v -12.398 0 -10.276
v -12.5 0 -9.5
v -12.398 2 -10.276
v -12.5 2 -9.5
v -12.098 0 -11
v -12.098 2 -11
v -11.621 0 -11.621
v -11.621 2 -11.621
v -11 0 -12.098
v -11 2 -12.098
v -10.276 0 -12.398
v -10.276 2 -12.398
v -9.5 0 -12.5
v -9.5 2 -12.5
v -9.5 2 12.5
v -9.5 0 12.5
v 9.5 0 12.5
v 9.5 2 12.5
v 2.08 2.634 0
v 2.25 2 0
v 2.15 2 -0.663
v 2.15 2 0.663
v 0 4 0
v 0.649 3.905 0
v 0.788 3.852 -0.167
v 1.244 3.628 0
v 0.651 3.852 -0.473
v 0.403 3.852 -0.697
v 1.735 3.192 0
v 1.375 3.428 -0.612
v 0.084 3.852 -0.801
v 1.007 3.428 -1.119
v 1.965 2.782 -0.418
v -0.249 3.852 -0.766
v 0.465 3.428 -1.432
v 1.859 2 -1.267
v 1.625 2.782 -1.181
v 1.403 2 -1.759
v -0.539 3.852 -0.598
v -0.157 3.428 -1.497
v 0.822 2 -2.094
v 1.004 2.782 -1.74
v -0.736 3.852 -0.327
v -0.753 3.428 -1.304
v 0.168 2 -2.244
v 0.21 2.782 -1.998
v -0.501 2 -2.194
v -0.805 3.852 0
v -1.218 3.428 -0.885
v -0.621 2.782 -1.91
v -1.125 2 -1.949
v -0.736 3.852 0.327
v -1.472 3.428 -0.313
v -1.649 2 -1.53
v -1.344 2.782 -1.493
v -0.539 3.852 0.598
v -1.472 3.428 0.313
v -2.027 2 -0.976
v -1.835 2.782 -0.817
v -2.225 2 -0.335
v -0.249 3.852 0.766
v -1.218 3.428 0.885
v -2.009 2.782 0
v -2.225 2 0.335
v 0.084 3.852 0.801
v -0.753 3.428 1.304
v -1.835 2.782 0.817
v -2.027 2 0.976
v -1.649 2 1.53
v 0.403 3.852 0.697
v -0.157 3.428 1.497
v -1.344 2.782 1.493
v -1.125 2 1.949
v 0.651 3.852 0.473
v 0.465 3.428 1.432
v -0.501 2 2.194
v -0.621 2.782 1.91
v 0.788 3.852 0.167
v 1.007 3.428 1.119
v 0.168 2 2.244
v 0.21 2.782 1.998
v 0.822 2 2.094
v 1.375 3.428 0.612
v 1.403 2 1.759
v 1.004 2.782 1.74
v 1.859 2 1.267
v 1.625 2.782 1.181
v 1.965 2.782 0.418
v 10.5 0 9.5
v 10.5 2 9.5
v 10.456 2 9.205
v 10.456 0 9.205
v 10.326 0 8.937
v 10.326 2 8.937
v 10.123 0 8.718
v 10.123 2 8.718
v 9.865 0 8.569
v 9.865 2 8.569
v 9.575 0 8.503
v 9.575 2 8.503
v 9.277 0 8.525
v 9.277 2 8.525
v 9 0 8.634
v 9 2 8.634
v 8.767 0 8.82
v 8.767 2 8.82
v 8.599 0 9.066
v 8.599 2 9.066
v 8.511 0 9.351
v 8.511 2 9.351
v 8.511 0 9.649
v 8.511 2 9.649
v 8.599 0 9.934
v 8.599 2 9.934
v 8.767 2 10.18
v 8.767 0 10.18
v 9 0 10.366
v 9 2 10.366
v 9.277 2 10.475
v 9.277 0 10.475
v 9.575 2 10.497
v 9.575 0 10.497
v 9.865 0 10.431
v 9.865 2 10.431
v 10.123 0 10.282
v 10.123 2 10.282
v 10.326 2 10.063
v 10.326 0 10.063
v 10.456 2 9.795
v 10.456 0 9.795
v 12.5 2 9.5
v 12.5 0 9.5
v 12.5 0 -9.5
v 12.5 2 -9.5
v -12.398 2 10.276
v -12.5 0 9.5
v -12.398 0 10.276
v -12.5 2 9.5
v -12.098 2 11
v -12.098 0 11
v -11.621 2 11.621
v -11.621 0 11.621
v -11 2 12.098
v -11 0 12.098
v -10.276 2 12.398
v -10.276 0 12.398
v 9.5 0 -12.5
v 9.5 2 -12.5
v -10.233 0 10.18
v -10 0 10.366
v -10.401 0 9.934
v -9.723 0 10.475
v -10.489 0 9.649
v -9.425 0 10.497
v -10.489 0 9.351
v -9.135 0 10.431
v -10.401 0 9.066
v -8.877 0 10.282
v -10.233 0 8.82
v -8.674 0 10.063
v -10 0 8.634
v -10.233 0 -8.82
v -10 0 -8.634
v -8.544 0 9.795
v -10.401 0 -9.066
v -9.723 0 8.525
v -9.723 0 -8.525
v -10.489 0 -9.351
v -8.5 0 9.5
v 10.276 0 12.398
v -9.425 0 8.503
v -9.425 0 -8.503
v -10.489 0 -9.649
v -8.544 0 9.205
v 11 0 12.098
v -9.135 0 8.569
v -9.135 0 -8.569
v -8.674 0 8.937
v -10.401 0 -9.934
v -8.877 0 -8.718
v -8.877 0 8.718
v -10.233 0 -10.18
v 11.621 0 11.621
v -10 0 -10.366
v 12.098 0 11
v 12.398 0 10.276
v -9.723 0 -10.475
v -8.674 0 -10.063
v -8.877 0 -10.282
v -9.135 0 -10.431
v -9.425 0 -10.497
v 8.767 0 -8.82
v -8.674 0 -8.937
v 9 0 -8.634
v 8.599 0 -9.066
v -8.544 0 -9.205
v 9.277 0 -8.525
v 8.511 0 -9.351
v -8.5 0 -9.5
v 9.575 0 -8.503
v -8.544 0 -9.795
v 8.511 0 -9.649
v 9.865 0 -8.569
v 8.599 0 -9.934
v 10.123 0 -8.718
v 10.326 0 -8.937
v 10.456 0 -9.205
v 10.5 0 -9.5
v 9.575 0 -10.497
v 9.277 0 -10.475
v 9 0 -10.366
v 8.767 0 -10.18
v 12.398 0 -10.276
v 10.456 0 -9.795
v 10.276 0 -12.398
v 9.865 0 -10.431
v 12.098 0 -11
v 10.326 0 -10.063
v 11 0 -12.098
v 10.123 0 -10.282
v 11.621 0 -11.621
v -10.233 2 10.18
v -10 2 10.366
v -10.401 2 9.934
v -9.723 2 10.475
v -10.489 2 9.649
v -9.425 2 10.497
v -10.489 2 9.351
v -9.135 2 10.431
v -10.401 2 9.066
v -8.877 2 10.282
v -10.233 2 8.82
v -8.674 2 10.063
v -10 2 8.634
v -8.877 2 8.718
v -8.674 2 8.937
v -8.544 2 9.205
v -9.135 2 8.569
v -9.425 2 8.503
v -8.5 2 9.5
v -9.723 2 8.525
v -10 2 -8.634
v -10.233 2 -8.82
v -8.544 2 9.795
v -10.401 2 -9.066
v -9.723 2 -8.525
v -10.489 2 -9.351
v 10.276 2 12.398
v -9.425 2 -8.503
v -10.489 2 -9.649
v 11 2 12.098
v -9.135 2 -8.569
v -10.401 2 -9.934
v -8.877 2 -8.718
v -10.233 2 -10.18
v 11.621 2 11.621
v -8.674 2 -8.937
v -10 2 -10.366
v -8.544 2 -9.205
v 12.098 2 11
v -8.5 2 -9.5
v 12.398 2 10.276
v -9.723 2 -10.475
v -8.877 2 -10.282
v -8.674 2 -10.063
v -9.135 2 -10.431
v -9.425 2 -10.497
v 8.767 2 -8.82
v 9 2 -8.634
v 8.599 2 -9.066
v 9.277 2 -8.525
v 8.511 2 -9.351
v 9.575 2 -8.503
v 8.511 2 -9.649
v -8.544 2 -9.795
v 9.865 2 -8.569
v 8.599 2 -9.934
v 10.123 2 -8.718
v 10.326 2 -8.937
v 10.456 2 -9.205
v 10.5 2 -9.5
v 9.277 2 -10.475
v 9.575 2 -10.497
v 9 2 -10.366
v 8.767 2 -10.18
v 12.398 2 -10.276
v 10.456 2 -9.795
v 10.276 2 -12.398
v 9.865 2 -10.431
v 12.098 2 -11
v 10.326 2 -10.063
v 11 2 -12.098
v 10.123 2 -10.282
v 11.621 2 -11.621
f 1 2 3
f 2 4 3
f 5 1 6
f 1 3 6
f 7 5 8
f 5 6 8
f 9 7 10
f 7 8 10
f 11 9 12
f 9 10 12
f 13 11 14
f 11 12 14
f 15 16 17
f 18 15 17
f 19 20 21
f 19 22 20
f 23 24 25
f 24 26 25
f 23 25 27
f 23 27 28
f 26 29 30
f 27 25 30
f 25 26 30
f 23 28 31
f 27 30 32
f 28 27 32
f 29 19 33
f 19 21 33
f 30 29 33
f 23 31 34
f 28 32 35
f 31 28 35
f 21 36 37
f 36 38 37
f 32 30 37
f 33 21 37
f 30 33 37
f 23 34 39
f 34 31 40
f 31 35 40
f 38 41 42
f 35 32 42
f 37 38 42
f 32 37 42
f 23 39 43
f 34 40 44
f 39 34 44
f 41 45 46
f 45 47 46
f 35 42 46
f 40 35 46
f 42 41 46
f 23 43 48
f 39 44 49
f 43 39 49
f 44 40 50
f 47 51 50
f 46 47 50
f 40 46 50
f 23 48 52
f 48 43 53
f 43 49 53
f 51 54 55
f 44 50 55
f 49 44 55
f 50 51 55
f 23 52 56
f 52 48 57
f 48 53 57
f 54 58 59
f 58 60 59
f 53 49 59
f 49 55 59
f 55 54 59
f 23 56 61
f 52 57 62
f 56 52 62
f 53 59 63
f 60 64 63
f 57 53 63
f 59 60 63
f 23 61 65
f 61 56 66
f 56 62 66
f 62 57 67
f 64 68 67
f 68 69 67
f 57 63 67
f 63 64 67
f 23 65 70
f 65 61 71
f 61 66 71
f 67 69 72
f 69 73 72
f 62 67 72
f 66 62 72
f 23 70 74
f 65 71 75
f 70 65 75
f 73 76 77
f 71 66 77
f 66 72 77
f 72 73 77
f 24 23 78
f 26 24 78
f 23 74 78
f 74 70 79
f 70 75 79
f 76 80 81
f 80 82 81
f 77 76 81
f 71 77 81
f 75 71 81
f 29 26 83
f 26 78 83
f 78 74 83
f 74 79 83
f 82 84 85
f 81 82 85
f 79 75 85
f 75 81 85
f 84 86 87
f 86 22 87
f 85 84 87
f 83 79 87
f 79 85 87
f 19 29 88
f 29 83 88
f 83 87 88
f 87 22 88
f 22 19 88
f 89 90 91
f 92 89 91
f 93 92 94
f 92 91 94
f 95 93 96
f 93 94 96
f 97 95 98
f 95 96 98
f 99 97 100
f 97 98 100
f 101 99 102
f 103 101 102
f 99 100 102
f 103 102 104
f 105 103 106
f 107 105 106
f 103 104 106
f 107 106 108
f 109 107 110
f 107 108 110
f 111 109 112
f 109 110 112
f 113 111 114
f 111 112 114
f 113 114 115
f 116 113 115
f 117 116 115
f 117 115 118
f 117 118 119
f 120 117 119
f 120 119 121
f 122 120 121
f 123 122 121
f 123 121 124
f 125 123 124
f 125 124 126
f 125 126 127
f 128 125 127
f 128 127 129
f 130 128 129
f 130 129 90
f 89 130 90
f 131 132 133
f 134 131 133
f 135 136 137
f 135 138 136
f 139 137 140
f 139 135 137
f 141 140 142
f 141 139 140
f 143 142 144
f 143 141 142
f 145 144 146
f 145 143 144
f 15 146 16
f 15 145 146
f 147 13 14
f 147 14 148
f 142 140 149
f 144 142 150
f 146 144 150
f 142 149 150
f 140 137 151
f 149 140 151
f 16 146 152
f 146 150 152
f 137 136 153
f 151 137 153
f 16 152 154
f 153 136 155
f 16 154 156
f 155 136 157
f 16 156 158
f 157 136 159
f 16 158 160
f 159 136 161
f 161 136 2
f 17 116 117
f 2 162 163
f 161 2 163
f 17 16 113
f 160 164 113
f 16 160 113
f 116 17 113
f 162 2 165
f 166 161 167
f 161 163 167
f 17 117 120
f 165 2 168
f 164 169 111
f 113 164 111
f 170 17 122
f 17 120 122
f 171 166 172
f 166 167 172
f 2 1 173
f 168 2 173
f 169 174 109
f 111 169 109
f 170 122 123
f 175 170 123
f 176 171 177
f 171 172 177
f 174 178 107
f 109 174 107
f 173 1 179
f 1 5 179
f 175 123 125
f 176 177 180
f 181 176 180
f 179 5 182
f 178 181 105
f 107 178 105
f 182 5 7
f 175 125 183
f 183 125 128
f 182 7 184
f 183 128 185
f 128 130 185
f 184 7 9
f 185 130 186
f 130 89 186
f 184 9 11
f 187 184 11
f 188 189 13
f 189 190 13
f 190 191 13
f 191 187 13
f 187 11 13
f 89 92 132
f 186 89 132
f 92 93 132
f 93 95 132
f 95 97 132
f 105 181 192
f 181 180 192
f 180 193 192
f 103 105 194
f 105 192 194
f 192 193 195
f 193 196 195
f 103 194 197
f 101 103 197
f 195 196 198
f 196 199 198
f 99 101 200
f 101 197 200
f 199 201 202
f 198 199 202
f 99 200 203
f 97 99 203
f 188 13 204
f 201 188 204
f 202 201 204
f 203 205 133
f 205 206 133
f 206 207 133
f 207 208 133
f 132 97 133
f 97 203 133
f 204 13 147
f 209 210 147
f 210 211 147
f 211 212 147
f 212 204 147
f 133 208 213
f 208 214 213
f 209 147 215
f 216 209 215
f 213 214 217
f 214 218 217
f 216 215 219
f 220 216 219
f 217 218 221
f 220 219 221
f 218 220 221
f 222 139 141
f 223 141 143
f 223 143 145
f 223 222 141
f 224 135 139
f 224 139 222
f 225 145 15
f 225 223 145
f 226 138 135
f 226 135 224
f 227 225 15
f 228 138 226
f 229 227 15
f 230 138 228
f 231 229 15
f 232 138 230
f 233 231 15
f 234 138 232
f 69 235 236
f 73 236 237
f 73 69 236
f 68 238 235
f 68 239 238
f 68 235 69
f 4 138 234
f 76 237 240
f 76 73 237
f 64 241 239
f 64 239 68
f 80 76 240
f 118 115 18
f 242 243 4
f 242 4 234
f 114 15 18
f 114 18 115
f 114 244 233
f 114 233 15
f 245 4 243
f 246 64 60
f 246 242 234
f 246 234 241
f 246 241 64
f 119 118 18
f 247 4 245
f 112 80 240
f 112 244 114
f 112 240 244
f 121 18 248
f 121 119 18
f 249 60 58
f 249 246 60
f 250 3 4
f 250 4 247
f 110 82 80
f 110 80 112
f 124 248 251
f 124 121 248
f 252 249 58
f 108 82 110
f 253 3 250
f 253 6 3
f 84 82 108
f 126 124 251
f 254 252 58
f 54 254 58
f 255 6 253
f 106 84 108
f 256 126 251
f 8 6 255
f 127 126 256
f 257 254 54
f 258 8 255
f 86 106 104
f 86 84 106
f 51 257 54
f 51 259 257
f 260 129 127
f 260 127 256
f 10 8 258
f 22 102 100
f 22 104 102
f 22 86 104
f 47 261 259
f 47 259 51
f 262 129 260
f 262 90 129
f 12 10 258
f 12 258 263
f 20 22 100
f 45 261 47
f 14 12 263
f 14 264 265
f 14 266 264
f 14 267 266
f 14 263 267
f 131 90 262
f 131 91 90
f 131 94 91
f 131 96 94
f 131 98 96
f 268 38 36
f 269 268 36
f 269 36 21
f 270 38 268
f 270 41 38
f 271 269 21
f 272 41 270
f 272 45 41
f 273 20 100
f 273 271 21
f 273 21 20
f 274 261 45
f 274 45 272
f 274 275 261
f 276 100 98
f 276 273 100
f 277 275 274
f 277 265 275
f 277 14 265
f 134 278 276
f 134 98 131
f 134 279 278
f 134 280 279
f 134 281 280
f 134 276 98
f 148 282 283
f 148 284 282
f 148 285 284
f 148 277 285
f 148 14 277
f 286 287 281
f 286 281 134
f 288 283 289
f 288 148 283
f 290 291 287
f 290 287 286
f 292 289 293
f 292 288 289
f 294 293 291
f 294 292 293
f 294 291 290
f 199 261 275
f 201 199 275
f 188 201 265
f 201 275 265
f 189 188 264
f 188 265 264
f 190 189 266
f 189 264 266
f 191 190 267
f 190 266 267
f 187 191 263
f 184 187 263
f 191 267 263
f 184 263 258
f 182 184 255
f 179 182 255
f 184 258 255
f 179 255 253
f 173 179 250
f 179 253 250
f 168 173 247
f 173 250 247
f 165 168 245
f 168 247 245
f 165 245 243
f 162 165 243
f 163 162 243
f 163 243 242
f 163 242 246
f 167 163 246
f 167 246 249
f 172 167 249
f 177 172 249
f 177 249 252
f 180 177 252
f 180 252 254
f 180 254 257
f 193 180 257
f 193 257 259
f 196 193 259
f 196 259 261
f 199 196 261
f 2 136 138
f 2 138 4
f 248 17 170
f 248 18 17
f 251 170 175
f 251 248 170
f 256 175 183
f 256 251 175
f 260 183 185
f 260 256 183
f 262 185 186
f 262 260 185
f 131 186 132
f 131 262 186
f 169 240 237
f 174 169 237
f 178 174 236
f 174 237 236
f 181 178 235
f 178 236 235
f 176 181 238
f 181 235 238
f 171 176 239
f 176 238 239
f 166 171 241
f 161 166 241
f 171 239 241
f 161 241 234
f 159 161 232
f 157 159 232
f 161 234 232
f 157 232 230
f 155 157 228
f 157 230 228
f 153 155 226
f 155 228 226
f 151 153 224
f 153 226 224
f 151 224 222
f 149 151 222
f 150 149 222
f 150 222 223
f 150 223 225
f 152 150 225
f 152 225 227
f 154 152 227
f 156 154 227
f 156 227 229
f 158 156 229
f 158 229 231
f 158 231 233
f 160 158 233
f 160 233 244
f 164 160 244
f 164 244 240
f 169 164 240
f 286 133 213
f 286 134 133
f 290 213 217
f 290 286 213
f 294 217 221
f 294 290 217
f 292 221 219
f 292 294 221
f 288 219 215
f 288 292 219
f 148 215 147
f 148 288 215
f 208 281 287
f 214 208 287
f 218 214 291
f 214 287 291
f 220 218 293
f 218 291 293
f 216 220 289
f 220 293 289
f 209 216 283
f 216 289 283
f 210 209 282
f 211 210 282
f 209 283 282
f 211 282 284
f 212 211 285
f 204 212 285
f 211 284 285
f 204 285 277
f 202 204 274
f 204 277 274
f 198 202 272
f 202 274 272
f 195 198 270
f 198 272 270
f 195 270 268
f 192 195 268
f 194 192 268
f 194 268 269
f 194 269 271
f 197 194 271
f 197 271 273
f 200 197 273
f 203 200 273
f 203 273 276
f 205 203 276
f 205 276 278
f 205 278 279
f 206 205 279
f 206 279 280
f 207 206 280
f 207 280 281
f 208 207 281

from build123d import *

# Parameters (mm, degrees)
SKETCH1_W           = 25
SKETCH1_H           = 25
BOSS_EXTRUDE1_DEPTH = 2
FILLET1_R           = 3
CUT_EXTRUDE1_REACH  = 4
SKETCH2_R           = 1


with BuildPart() as part:
    # Sketch1 → Boss-Extrude1 (new body)
    with BuildSketch(Plane(origin=(0, 0, 0), x_dir=(1, 0, 0), z_dir=(0, 1, 0))):
        Rectangle(SKETCH1_W, SKETCH1_H)
    extrude(amount=BOSS_EXTRUDE1_DEPTH)

    # Fillet1
    fillet1_edges = [part.edges().sort_by_distance(p)[0] for p in [
        (12.5, 1, 12.5),
        (-12.5, 1, 12.5),
        (-12.5, 1, -12.5),
        (12.5, 1, -12.5),
    ]]
    fillet(fillet1_edges, radius=FILLET1_R)

    # Sketch2 → Cut-Extrude1 (cut, up to next)
    with BuildSketch(Plane(origin=(0, 2, 0), x_dir=(1, 0, 0), z_dir=(0, 1, 0)), mode=Mode.PRIVATE) as cut_extrude1_sk1:
        with Locations((-9.5, 9.5)):
            Circle(SKETCH2_R)
    cut_extrude1_tool1 = extrude(cut_extrude1_sk1.sketch, amount=-CUT_EXTRUDE1_REACH, mode=Mode.PRIVATE) & part.part
    add(cut_extrude1_tool1.solids().sort_by_distance((-9.5, 2, -9.5))[0], mode=Mode.SUBTRACT)
    # Sketch2 → Cut-Extrude1 (cut, up to next)
    with BuildSketch(Plane(origin=(0, 2, 0), x_dir=(1, 0, 0), z_dir=(0, 1, 0)), mode=Mode.PRIVATE) as cut_extrude1_sk2:
        with Locations((9.5, 9.5)):
            Circle(SKETCH2_R)
    cut_extrude1_tool2 = extrude(cut_extrude1_sk2.sketch, amount=-CUT_EXTRUDE1_REACH, mode=Mode.PRIVATE) & part.part
    add(cut_extrude1_tool2.solids().sort_by_distance((9.5, 2, -9.5))[0], mode=Mode.SUBTRACT)
    # Sketch2 → Cut-Extrude1 (cut, up to next)
    with BuildSketch(Plane(origin=(0, 2, 0), x_dir=(1, 0, 0), z_dir=(0, 1, 0)), mode=Mode.PRIVATE) as cut_extrude1_sk3:
        with Locations((9.5, -9.5)):
            Circle(SKETCH2_R)
    cut_extrude1_tool3 = extrude(cut_extrude1_sk3.sketch, amount=-CUT_EXTRUDE1_REACH, mode=Mode.PRIVATE) & part.part
    add(cut_extrude1_tool3.solids().sort_by_distance((9.5, 2, 9.5))[0], mode=Mode.SUBTRACT)
    # Sketch2 → Cut-Extrude1 (cut, up to next)
    with BuildSketch(Plane(origin=(0, 2, 0), x_dir=(1, 0, 0), z_dir=(0, 1, 0)), mode=Mode.PRIVATE) as cut_extrude1_sk4:
        with Locations((-9.5, -9.5)):
            Circle(SKETCH2_R)
    cut_extrude1_tool4 = extrude(cut_extrude1_sk4.sketch, amount=-CUT_EXTRUDE1_REACH, mode=Mode.PRIVATE) & part.part
    add(cut_extrude1_tool4.solids().sort_by_distance((-9.5, 2, 9.5))[0], mode=Mode.SUBTRACT)

    # Sketch3 → Revolve1 (revolve)
    with BuildSketch(Plane.XY):
        with BuildLine():
            Line((0, 2), (0, 4))
            ThreePointArc((0, 4), (1.505199322, 3.427724238), (2.25, 2))
            Line((2.25, 2), (0, 2))
        make_face()
    revolve(axis=Axis((0, 2, 0), (0, 1, 0)))


solid = part.part
